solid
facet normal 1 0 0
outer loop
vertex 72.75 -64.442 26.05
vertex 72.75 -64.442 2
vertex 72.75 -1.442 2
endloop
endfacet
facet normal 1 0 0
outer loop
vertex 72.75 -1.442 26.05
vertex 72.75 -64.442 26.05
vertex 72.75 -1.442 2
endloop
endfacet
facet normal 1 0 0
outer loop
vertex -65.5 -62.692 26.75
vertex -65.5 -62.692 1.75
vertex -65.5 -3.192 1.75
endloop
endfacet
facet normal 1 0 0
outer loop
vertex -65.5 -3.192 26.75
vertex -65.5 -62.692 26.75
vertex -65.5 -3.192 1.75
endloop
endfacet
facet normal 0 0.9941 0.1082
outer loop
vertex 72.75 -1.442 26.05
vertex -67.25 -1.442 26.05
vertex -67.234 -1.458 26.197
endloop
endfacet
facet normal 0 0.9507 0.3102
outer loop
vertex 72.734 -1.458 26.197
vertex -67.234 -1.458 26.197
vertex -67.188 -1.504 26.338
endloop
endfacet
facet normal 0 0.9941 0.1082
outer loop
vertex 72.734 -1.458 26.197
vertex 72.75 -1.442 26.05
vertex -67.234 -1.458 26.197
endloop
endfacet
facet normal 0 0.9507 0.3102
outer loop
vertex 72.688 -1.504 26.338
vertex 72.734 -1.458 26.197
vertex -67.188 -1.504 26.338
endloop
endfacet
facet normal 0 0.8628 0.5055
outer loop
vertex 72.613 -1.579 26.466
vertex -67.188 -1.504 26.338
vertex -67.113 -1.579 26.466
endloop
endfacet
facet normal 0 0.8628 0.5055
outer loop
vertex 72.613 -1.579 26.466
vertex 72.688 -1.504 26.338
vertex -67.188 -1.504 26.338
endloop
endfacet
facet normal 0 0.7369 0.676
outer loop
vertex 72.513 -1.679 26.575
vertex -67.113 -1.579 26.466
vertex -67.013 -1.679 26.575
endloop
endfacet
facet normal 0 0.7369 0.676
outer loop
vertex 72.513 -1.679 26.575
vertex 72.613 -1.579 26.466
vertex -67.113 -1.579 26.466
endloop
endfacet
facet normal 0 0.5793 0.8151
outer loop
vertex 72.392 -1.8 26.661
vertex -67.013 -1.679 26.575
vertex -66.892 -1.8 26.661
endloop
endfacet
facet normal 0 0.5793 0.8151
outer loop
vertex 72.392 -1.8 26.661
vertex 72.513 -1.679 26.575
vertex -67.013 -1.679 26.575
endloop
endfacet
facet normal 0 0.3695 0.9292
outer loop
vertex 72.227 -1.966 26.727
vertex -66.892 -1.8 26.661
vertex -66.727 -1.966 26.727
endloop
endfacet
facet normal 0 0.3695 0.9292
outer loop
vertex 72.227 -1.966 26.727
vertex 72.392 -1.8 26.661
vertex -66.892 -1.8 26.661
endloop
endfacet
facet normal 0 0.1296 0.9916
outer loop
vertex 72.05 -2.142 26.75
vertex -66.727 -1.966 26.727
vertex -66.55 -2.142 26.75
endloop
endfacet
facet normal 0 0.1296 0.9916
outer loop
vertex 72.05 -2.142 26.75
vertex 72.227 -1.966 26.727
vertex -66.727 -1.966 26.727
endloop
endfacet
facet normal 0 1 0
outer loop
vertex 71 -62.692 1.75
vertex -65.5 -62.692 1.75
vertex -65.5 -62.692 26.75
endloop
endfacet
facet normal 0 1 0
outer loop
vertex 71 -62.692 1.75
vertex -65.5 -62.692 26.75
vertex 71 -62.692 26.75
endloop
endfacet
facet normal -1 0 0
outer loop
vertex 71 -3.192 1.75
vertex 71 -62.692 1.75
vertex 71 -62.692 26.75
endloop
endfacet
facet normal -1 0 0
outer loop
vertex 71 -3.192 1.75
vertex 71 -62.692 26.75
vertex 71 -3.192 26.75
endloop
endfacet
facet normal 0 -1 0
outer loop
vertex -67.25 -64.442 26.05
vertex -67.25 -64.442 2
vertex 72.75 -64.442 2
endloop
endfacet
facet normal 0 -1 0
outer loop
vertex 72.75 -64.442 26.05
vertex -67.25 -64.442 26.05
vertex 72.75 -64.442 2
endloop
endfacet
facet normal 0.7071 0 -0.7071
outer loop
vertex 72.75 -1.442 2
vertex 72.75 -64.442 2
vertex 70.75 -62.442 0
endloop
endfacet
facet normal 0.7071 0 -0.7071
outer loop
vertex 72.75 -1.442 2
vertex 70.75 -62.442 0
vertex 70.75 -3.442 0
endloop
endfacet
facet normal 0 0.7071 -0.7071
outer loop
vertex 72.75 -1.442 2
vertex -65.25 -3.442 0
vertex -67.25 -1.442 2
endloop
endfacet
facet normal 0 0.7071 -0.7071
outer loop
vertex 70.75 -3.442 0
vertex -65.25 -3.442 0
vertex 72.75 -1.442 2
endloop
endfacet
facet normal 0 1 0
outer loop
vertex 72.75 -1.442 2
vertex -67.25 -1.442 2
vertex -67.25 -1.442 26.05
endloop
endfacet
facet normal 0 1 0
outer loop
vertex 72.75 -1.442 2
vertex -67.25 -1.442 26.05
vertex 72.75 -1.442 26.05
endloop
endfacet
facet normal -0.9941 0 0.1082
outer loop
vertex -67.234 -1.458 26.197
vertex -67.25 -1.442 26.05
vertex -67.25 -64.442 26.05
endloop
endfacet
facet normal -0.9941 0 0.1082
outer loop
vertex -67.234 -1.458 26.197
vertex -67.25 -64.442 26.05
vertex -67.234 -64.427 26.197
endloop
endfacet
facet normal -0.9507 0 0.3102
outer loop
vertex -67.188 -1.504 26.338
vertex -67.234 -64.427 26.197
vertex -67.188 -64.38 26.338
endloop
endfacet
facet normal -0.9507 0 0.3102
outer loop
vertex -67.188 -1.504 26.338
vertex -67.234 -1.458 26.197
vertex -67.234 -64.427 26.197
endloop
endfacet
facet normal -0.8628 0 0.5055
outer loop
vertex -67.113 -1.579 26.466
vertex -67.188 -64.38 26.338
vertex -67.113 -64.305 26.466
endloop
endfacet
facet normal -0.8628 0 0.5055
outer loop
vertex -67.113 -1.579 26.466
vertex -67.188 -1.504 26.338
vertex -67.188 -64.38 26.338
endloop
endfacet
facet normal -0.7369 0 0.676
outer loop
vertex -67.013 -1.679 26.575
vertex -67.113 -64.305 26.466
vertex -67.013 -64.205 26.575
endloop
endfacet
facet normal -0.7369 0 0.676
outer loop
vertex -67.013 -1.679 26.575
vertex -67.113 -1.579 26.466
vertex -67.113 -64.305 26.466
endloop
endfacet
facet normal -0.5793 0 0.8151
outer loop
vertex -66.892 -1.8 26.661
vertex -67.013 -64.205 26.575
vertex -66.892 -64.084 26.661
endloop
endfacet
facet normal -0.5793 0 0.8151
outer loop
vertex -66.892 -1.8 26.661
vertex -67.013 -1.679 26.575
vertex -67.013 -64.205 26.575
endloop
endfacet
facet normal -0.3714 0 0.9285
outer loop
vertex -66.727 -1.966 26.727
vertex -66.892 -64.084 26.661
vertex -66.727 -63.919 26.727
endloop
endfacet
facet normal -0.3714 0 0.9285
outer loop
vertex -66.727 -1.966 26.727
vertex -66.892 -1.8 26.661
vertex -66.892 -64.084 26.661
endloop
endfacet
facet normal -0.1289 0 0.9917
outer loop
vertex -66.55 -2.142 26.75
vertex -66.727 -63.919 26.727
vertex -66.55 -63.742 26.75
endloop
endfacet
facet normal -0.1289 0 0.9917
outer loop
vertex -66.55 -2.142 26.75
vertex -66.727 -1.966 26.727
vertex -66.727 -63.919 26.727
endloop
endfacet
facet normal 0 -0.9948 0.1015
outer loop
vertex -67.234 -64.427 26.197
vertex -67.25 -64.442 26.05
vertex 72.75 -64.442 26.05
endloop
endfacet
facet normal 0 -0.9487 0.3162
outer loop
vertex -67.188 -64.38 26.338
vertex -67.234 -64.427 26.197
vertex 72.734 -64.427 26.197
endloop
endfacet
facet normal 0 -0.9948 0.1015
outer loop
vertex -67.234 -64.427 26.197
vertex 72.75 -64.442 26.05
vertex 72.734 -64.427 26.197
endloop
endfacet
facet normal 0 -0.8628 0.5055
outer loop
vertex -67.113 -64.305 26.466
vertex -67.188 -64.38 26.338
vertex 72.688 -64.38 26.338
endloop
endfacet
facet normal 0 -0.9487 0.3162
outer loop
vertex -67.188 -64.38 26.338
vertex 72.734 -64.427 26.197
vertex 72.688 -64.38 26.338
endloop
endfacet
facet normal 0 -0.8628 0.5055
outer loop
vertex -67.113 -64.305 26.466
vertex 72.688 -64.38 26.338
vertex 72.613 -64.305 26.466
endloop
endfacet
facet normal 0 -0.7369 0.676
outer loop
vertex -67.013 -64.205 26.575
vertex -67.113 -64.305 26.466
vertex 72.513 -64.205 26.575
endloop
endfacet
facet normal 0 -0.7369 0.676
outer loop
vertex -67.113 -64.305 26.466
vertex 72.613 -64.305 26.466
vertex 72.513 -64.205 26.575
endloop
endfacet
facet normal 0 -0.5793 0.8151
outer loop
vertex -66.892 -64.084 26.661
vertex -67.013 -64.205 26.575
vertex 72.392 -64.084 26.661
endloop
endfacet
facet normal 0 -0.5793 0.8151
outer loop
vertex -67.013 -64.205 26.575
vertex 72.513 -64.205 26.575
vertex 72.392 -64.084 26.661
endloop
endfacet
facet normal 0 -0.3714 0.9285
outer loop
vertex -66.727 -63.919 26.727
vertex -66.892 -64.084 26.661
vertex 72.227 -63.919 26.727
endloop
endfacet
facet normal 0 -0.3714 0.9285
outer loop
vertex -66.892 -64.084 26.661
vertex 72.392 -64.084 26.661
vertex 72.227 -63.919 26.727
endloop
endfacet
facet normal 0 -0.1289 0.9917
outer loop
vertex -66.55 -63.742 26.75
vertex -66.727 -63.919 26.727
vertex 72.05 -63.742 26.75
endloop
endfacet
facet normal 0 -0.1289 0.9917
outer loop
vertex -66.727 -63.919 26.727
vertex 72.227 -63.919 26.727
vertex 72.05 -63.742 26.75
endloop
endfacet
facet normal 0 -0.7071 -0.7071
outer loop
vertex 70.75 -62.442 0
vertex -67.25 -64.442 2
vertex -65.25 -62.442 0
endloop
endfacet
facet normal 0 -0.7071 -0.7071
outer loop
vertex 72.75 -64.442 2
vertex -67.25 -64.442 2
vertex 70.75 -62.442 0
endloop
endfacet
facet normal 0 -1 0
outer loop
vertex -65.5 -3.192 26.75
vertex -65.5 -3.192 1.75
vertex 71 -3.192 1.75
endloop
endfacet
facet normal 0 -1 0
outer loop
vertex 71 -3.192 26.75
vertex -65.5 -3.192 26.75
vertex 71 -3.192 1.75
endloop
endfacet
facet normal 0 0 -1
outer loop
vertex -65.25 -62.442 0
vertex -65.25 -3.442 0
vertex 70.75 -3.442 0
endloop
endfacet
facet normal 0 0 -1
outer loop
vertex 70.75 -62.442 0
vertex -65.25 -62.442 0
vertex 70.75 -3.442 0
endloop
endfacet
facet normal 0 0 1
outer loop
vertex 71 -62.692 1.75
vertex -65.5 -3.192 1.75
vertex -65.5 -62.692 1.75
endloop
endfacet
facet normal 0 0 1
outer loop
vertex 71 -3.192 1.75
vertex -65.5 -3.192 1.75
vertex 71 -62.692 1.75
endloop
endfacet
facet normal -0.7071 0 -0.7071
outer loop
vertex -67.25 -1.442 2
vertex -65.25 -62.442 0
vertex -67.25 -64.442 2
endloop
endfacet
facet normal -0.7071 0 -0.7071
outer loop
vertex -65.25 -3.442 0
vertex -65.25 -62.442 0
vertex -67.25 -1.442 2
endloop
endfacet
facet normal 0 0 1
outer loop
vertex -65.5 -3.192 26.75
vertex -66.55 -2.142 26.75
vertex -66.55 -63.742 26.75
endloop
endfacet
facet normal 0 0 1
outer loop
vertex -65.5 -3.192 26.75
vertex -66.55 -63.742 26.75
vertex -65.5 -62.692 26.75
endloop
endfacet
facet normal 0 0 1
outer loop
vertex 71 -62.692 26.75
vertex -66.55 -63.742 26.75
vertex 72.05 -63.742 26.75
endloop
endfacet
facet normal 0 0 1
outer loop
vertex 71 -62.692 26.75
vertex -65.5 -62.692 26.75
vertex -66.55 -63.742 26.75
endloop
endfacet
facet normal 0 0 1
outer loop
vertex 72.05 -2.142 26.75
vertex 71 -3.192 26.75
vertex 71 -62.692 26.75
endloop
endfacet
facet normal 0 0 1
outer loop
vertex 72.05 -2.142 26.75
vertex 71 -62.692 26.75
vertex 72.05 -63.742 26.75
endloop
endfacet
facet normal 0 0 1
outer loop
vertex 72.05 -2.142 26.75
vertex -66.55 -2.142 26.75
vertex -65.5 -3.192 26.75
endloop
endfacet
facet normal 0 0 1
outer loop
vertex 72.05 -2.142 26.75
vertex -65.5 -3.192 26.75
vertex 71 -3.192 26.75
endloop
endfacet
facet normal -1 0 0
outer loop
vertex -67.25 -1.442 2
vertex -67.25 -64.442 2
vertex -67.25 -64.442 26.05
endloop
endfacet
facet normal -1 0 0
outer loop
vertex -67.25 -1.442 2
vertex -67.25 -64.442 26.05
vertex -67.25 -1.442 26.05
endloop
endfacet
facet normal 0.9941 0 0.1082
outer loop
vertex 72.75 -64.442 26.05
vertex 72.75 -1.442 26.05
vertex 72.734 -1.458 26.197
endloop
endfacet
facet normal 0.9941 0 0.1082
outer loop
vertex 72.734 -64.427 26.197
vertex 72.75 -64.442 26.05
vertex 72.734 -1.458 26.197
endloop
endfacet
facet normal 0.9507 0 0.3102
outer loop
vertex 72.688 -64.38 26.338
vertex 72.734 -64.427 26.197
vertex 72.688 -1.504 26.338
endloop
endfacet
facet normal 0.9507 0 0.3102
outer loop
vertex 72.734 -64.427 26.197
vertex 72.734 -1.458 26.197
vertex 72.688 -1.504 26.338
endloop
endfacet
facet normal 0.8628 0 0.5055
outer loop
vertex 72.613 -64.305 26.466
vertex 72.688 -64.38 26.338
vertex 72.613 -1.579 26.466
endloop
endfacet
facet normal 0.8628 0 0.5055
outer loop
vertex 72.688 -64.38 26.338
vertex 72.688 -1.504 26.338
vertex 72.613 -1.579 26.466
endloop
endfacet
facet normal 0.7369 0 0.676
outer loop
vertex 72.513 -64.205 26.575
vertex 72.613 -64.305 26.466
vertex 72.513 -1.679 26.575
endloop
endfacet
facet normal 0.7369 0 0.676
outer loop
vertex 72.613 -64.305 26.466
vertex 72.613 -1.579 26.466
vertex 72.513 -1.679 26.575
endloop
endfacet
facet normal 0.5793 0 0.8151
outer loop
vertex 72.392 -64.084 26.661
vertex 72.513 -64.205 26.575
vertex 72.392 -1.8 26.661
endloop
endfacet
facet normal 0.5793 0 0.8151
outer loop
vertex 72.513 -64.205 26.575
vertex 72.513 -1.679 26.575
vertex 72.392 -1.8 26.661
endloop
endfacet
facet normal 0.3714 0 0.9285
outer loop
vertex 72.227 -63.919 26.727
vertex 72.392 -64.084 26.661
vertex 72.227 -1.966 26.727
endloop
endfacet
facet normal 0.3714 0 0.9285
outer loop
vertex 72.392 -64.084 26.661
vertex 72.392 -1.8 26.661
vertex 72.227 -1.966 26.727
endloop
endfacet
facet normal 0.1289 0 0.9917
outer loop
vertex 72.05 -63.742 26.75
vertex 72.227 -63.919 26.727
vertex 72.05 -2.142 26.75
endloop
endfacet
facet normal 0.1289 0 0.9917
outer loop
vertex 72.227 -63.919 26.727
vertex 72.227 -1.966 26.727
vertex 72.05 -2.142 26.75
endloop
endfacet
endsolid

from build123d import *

# Parameters (mm, degrees)
F0_W     = 140
F0_H     = 63
F1_DEPTH = 1.75
F2_W     = 140
F2_H     = 63
F2_W_2   = 136.5
F2_H_2   = 59.5
F3_DEPTH = 25
F4_R     = 0.7
F5_SIZE  = 2


with BuildPart() as f1:
    # F0 (on Top) → F1 (new body)
    with BuildSketch(Plane.XY):
        with Locations((2.7499999851, -32.9423031422)):
            Rectangle(F0_W, F0_H)
    extrude(amount=F1_DEPTH)

    # F2 (on face) → F3 (join)
    with BuildSketch(Plane.XY.offset(1.75)):
        with Locations((2.7499999851, -32.9423031422)):
            Rectangle(F2_W, F2_H)
        with Locations((2.7499999851, -32.9423031422)):
            Rectangle(F2_W_2, F2_H_2, mode=Mode.SUBTRACT)
    extrude(amount=F3_DEPTH)

    # F4
    f4_edges = [f1.edges().sort_by_distance(p)[0] for p in [
        (2.75, -1.442303, 26.75),
        (72.75, -32.942303, 26.75),
        (2.75, -64.442303, 26.75),
        (-67.25, -32.942303, 26.75),
    ]]
    fillet(f4_edges, radius=F4_R)

    # F5
    f5_edges = [f1.edges().sort_by_distance(p)[0] for p in [
        (2.75, -1.442303, 0),
        (-67.25, -32.942303, 0),
        (2.75, -64.442303, 0),
        (72.75, -32.942303, 0),
    ]]
    chamfer(f5_edges, length=F5_SIZE)


solid = f1.part
